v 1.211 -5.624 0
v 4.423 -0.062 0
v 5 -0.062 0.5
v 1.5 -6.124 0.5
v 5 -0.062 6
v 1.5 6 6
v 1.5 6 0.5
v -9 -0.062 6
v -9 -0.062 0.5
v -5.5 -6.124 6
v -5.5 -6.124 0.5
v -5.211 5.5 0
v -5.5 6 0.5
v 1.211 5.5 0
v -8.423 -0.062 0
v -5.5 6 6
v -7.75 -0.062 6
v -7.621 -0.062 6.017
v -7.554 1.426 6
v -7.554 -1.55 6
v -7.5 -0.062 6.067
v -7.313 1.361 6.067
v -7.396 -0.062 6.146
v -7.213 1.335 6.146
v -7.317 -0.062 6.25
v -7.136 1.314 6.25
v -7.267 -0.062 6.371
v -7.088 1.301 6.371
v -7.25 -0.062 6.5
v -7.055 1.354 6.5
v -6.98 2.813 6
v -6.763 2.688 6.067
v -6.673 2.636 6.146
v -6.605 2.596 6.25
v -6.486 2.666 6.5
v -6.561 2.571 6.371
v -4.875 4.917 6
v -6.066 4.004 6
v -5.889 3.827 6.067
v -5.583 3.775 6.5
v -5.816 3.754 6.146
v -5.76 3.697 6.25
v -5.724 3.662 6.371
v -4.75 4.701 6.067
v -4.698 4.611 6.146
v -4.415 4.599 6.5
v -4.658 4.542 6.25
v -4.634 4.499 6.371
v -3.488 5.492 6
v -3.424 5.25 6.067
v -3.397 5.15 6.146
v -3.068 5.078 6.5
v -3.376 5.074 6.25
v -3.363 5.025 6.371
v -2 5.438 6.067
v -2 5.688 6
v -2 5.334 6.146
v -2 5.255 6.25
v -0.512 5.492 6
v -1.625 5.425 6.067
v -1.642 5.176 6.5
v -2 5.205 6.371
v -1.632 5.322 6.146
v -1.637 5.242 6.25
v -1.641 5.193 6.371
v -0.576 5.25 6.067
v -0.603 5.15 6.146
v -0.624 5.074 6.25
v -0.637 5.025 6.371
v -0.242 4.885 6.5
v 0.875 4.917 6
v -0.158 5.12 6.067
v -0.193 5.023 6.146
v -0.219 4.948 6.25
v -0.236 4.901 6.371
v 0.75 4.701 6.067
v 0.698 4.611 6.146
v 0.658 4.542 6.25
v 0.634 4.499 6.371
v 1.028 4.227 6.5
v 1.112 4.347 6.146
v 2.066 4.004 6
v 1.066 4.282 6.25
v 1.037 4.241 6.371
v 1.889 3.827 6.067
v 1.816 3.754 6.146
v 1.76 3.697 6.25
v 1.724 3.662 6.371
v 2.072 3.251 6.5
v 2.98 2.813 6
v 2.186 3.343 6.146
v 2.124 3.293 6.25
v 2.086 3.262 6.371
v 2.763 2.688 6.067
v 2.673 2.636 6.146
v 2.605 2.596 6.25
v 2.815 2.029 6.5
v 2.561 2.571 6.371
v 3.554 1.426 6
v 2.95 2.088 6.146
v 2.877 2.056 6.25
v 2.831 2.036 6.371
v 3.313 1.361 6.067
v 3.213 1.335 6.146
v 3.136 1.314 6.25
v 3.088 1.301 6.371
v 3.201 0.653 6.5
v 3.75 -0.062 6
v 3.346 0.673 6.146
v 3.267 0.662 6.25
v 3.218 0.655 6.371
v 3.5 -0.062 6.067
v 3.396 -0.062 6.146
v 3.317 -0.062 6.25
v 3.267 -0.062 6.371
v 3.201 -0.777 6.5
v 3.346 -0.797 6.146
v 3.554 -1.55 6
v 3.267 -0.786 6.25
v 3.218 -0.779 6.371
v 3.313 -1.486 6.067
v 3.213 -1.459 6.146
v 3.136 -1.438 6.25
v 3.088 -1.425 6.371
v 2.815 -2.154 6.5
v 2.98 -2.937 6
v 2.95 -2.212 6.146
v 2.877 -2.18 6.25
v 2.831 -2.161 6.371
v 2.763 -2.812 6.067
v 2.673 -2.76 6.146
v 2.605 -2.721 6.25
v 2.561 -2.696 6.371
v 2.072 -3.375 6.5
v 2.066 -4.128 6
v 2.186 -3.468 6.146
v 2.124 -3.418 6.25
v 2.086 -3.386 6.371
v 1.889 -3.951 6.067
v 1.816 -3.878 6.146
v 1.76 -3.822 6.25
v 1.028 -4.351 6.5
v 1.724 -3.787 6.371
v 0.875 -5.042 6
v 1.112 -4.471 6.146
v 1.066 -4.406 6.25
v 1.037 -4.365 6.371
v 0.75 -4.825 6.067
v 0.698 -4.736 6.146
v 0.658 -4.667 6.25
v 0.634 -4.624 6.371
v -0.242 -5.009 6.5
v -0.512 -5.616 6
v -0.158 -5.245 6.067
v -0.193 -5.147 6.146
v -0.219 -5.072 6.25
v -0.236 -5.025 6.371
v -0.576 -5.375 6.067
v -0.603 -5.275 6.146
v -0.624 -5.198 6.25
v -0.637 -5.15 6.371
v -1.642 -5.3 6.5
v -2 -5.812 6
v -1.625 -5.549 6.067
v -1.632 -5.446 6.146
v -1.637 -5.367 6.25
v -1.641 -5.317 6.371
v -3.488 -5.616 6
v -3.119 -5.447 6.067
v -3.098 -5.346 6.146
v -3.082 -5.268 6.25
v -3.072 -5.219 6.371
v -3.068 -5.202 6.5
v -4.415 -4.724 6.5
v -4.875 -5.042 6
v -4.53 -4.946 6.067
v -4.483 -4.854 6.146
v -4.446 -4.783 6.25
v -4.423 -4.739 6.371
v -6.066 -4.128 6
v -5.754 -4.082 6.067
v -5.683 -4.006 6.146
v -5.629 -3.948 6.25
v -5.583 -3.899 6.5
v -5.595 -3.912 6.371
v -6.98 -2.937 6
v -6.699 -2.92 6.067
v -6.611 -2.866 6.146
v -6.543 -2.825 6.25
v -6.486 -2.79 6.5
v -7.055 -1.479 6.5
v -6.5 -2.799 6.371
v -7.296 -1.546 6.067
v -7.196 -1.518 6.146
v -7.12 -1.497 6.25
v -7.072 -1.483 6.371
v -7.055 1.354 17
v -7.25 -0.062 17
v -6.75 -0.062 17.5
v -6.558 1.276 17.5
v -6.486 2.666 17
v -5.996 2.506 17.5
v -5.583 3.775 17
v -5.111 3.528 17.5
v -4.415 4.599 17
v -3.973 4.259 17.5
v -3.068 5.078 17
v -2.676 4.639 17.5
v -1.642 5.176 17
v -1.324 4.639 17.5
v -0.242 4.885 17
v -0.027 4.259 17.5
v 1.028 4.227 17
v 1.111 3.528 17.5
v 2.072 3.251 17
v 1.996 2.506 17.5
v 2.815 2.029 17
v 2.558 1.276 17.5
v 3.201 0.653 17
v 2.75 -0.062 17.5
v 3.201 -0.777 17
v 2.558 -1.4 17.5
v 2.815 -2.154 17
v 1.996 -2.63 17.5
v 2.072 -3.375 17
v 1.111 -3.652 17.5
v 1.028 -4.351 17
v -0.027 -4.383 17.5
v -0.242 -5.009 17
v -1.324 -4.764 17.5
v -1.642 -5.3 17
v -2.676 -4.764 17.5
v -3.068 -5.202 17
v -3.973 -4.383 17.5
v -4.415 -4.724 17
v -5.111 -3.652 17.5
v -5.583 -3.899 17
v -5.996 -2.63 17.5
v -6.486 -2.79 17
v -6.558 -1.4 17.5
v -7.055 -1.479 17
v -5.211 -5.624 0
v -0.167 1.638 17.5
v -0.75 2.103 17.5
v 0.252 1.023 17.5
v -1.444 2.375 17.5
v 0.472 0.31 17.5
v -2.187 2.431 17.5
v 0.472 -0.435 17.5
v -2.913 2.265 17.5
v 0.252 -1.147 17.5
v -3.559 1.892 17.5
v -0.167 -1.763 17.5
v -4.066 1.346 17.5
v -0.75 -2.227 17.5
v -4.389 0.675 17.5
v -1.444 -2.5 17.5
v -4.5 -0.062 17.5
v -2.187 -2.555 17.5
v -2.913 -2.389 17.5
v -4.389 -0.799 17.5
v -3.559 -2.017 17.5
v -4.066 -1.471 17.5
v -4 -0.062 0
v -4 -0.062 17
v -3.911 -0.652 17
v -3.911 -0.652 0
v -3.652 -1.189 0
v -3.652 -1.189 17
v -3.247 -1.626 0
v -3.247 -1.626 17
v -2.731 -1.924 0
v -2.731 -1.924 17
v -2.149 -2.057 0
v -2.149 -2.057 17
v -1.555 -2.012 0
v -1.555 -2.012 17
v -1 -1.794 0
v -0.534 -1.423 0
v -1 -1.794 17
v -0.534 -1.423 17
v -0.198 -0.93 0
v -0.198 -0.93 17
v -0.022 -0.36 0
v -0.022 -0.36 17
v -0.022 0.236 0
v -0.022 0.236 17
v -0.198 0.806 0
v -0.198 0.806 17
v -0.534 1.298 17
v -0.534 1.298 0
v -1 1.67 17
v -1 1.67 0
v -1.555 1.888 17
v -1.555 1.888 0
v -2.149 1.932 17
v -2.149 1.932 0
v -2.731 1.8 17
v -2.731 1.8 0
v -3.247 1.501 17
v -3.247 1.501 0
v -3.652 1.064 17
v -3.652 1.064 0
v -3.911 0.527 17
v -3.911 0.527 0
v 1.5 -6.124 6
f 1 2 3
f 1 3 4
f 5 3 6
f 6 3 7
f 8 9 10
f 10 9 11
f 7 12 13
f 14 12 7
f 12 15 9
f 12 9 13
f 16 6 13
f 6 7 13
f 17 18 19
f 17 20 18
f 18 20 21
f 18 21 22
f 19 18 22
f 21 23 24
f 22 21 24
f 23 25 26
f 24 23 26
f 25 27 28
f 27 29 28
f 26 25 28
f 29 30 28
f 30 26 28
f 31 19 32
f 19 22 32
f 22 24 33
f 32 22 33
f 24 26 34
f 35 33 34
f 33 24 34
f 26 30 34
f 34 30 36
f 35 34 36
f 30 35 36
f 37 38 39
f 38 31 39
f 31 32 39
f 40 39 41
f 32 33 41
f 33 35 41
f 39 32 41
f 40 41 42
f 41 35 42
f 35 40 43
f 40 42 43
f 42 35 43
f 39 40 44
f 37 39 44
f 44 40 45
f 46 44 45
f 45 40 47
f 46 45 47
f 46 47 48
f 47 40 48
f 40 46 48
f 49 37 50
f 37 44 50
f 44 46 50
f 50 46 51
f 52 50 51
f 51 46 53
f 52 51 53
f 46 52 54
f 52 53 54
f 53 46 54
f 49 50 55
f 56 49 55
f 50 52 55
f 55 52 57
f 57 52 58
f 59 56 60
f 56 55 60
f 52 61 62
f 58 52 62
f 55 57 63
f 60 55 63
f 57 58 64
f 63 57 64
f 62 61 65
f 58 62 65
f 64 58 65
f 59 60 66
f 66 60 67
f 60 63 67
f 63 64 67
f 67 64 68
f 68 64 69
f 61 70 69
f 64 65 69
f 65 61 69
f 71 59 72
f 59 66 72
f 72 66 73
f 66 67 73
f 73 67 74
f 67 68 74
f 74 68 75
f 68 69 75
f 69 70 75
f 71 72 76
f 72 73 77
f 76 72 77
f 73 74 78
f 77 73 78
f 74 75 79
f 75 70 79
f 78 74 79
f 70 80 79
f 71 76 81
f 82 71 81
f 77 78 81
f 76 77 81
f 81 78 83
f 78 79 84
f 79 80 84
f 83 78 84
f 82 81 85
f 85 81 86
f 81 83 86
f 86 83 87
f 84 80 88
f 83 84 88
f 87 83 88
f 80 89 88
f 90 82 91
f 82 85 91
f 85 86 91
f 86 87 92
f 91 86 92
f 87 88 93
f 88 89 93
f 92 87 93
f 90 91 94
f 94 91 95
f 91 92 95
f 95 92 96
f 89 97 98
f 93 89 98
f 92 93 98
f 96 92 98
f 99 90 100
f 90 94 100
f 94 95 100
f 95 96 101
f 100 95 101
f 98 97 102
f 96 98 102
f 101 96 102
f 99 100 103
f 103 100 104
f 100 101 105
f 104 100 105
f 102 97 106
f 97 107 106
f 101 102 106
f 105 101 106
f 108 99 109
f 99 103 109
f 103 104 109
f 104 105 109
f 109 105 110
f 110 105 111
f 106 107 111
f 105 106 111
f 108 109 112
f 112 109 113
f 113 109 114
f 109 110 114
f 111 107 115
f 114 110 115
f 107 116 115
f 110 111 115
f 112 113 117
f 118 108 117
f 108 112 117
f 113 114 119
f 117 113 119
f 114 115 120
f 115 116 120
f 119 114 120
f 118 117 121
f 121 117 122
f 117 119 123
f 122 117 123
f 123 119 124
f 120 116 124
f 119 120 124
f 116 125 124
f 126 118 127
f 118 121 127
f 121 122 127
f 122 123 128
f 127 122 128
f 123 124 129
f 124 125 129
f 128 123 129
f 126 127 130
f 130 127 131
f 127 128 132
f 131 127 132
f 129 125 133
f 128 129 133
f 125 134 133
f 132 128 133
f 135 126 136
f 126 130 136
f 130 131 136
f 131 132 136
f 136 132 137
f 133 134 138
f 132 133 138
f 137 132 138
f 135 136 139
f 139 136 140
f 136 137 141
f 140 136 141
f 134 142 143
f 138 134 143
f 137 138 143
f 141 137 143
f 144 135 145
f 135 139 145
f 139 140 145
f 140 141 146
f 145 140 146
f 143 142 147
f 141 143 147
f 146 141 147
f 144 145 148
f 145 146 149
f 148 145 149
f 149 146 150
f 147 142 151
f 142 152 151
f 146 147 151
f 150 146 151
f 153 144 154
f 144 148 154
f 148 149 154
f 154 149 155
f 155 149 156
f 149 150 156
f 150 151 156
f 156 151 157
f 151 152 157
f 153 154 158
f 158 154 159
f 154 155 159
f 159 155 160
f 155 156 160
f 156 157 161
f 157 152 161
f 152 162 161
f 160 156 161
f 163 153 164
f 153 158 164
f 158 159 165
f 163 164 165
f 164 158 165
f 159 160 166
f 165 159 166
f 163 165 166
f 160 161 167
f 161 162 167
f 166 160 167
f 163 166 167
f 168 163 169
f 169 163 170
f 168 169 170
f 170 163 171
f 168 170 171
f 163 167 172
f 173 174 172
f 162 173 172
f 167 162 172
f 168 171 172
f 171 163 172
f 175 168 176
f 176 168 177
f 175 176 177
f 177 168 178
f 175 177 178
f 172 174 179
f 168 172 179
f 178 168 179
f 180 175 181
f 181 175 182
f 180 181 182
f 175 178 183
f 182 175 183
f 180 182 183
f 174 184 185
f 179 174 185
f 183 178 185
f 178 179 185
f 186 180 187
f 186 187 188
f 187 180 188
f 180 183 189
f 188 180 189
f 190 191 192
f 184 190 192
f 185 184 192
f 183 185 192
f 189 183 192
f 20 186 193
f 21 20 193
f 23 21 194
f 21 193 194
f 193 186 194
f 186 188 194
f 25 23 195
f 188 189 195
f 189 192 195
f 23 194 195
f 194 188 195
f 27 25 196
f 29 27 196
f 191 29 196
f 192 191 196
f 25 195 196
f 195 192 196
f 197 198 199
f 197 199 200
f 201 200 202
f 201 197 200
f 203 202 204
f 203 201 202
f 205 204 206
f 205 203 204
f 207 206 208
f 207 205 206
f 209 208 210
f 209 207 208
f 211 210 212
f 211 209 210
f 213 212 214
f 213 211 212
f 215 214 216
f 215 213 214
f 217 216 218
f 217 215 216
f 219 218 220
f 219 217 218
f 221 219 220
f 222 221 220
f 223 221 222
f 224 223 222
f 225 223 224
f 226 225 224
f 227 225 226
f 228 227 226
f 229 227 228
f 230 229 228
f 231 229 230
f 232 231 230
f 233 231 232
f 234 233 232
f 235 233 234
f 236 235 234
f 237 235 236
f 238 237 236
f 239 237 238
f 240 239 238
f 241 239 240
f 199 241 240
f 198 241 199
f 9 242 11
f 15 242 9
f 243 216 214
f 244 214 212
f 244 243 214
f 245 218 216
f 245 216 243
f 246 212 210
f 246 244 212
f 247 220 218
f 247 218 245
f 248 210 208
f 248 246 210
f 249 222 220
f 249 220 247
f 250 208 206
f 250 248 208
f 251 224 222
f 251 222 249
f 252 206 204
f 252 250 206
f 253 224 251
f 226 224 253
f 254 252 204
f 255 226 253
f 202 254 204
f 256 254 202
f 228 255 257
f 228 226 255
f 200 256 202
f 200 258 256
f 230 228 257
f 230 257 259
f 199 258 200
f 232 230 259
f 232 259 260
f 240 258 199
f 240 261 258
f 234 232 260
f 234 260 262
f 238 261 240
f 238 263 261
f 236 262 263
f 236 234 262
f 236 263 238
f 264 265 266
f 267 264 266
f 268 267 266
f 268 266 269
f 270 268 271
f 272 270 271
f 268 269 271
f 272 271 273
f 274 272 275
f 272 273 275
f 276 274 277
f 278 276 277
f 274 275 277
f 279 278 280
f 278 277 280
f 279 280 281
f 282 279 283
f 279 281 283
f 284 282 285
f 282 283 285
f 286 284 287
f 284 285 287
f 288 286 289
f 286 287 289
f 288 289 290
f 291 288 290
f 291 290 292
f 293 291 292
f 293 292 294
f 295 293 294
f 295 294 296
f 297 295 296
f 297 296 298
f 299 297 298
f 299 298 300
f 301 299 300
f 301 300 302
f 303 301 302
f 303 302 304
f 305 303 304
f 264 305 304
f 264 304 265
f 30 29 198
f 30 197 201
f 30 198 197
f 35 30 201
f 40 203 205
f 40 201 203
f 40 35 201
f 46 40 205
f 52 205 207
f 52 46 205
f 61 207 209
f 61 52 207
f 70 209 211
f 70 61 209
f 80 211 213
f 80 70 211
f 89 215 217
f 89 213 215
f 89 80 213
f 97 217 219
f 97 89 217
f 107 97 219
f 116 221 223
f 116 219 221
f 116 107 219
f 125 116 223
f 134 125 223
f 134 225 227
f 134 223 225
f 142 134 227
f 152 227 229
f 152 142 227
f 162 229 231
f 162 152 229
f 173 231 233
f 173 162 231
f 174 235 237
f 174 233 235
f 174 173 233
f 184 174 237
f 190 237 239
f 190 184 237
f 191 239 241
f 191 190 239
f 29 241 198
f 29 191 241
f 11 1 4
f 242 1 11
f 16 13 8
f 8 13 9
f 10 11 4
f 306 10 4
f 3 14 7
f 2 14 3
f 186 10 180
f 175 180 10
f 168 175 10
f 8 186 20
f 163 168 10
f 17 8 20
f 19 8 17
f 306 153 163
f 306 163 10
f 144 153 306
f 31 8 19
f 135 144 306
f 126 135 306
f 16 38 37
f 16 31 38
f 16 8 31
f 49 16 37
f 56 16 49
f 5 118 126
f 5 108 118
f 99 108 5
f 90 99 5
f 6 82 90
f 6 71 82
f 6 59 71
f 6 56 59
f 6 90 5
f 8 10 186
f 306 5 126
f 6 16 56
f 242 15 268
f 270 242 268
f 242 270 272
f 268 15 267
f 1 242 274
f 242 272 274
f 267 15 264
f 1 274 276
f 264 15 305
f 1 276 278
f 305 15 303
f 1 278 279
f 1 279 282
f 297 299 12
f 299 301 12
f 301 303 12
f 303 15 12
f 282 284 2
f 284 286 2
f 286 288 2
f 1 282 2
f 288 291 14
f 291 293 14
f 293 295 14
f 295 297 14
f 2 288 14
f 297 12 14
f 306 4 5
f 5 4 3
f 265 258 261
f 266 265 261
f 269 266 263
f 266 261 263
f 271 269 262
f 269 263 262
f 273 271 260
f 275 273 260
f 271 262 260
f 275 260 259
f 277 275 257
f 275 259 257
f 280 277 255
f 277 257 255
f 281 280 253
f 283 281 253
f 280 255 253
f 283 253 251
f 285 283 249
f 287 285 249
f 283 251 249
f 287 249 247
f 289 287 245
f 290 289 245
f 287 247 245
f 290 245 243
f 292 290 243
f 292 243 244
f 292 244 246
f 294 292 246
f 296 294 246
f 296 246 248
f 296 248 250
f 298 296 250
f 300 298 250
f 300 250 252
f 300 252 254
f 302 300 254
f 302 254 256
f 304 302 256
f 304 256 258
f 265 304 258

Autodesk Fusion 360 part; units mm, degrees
sketch "Sketch1" plane through (0, 0, 0) normal (0, 0, 1) x (1, 0, 0)
  line L0 (-5.5, 6) -> (-9, -0.0622)
  line L1 (-9, -0.0622) -> (-5.5, -6.1244)
  line L2 (-5.5, -6.1244) -> (1.5, -6.1244)
  line L3 (1.5, -6.1244) -> (5, -0.0622)
  line L4 (5, -0.0622) -> (1.5, 6)
  line L5 (1.5, 6) -> (-5.5, 6)
  point P0 (-2, -0.0622)
extrude "Extrude1" add sketch "Sketch1" along normal blind 6
sketch "Sketch2" plane through (0, 0, 6) normal (0, 0, 1) x (-1, 0, 0)
  line L0 (-1.5, -6) -> (5.5, -6)
  line L1 (5.5, -6) -> (9, 0.0622)
  line L2 (9, 0.0622) -> (5.5, 6.1244)
  line L3 (5.5, 6.1244) -> (-1.5, 6.1244)
  line L4 (-1.5, 6.1244) -> (-5, 0.0622)
  line L5 (-5, 0.0622) -> (-1.5, -6)
  circle A0 centre (2, 0.0622) radius 5.25
  dimension "d3" = 10.5
extrude "Extrude2" add sketch "Sketch2" along normal blind 11.5 contours A0
fillet "Fillet1" radius 0.5 1 edges at (2.8947, -1.9607, 6)
sketch "Sketch3" plane through (0, 0, 17.5) normal (0, 0, 1) x (-1, 0, 0)
  circle A0 centre (2, 0.0622) radius 5.25
  circle A1 centre (2, 0.0622) radius 2
  dimension "d8" = 4
extrude "Extrude3" cut sketch "Sketch3" against normal blind 31.5 contours A1
chamfer "Chamfer1" distance 0.5 angle 45 2 edges at (-0.1353, -0.7854, 17.5) (2.8947, 1.8363, 17.5)
chamfer "Chamfer2" distance 0.5 angle 45 6 edges at (-2, -6.1244, 0) (-7.25, -3.0933, 0) (-7.25, 2.9689, 0) (-2, 6, 0) (3.25, 2.9689, 0) (3.25, -3.0933, 0)
